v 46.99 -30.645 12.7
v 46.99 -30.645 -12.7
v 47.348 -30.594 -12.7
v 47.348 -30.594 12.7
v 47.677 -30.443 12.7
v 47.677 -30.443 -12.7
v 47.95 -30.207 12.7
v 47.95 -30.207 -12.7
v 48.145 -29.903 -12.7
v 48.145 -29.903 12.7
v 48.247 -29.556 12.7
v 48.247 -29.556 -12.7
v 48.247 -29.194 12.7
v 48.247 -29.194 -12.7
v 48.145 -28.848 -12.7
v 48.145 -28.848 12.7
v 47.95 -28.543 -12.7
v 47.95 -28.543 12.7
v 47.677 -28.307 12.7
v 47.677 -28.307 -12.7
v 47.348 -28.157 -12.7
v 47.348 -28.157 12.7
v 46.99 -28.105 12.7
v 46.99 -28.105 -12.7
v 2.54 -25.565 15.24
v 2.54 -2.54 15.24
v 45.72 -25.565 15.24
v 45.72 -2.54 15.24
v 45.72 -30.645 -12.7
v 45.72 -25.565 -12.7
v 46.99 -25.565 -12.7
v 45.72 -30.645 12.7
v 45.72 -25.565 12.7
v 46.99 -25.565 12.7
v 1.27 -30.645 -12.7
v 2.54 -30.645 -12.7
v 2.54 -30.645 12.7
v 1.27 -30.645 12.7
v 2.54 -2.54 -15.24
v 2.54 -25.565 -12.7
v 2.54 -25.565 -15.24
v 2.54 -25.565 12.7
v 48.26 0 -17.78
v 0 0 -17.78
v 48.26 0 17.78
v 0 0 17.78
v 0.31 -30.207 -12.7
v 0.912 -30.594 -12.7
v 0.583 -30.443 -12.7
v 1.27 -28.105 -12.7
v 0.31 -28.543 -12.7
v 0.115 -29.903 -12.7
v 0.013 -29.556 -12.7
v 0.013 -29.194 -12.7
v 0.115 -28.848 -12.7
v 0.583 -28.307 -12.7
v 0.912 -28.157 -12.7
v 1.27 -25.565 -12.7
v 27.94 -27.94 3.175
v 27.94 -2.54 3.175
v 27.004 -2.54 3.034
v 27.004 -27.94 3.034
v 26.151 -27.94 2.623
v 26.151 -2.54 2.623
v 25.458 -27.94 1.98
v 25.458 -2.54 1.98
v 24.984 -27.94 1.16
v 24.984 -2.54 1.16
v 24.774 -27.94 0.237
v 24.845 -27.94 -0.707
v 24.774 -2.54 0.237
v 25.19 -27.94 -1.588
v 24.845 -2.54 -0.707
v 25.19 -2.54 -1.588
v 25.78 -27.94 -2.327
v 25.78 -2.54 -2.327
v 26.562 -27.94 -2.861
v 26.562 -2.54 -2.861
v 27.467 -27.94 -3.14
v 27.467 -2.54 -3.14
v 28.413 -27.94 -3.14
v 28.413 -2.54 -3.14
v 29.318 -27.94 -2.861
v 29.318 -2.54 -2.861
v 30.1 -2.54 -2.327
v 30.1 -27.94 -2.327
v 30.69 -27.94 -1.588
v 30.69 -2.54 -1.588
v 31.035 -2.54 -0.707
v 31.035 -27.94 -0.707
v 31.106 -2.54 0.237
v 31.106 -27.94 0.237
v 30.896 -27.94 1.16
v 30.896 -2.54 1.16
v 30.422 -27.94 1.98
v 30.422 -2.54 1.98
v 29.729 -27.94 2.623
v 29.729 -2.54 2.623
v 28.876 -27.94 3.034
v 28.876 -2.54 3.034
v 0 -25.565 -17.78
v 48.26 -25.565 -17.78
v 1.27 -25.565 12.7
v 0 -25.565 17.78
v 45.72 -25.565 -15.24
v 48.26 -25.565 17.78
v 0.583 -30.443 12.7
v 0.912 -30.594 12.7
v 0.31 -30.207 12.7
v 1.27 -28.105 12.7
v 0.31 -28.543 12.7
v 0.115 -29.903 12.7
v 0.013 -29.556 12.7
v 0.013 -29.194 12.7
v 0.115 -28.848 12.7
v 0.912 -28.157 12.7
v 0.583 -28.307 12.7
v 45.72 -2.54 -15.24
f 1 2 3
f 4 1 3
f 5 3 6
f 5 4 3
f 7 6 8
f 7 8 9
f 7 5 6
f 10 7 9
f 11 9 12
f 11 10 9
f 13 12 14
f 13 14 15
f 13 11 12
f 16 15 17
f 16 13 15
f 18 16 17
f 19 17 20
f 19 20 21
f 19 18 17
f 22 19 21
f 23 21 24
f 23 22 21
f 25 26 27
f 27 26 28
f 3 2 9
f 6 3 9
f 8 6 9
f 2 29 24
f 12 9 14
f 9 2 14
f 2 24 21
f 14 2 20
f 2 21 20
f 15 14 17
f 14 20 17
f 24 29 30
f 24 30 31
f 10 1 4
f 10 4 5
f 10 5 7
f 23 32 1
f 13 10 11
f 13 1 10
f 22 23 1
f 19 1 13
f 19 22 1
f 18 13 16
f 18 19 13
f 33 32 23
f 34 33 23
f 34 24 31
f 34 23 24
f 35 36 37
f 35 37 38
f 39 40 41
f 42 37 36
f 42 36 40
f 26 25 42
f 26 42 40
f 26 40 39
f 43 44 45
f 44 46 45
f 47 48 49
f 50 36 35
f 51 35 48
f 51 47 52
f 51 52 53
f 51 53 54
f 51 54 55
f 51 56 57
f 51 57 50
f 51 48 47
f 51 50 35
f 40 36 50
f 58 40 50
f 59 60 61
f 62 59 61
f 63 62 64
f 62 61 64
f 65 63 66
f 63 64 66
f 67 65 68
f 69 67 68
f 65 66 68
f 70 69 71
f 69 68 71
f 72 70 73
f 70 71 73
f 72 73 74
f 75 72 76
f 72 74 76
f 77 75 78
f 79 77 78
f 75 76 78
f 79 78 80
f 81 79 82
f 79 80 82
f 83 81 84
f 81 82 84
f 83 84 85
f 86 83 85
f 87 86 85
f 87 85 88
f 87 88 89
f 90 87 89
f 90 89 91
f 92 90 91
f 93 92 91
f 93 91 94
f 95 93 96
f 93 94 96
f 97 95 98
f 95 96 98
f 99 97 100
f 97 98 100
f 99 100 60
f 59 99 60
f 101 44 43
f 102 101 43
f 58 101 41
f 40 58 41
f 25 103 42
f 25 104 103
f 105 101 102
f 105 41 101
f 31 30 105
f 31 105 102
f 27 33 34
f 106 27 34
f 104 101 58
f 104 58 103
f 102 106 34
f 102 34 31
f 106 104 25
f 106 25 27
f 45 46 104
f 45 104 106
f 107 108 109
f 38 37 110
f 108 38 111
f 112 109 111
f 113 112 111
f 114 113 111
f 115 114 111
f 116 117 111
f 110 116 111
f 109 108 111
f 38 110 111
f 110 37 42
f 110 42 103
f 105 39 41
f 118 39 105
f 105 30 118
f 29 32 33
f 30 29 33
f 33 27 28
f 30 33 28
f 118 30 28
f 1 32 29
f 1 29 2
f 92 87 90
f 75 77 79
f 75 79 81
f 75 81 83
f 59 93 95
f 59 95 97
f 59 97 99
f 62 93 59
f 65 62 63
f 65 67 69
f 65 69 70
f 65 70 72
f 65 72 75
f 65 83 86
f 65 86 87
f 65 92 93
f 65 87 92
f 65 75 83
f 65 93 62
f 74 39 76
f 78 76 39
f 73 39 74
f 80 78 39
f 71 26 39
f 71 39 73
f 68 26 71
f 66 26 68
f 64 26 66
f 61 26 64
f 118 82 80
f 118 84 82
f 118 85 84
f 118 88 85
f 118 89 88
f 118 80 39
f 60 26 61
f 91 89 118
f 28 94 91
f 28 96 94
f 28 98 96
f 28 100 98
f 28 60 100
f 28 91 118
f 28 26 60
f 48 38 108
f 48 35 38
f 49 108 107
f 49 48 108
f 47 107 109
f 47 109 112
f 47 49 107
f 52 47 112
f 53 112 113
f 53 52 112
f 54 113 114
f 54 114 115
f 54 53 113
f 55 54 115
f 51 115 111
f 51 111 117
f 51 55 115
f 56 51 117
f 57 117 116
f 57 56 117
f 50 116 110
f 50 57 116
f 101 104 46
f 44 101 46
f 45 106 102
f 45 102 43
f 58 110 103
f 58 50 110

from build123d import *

# Parameters (mm, degrees)
SKETCH1_W           = 48.26
SKETCH1_H           = 25.5651
BOSS_EXTRUDE1_DEPTH = 17.78
SHELL1_T            = -2.54
SKETCH2_R           = 3.175
BOSS_EXTRUDE2_DEPTH = 25.4
BOSS_EXTRUDE3_DEPTH = 12.7


with BuildPart() as part:
    # Sketch1 → Boss-Extrude1 (new, symmetric)
    with BuildSketch(Plane.XY):
        with Locations((24.13, -12.78255)):
            Rectangle(SKETCH1_W, SKETCH1_H)
    extrude(amount=BOSS_EXTRUDE1_DEPTH, both=True)

    # Shell1
    shell1_openings = [part.faces().sort_by_distance(p)[0] for p in [
        (24.13, -25.5651, 0),
    ]]
    offset(amount=SHELL1_T, openings=shell1_openings, kind=Kind.INTERSECTION)

    # Sketch2 → Boss-Extrude2 (add)
    with BuildSketch(Plane.XZ.offset(2.54)):
        with Locations(Location((27.94, 0, 0), (0, 0, 90))):
            Circle(SKETCH2_R)
    extrude(amount=BOSS_EXTRUDE2_DEPTH)

    # Sketch3 → Boss-Extrude3 (add, symmetric)
    with BuildSketch(Plane.XY):
        with BuildLine():
            Line((1.27, -25.5651), (2.54, -25.5651))
            Line((2.54, -25.5651), (2.54, -30.6451))
            Line((2.54, -30.6451), (1.27, -30.6451))
            ThreePointArc((1.27, -30.6451), (0, -29.3751), (1.27, -28.1051))
            Line((1.27, -28.1051), (1.27, -25.5651))
        make_face()
        with BuildLine():
            Line((45.72, -25.5651), (45.72, -30.6451))
            Line((45.72, -30.6451), (46.99, -30.6451))
            ThreePointArc((46.99, -30.6451), (48.26, -29.3751), (46.99, -28.1051))
            Line((46.99, -28.1051), (46.99, -25.5651))
            Line((46.99, -25.5651), (45.72, -25.5651))
        make_face()
    extrude(amount=BOSS_EXTRUDE3_DEPTH, both=True)


solid = part.part
